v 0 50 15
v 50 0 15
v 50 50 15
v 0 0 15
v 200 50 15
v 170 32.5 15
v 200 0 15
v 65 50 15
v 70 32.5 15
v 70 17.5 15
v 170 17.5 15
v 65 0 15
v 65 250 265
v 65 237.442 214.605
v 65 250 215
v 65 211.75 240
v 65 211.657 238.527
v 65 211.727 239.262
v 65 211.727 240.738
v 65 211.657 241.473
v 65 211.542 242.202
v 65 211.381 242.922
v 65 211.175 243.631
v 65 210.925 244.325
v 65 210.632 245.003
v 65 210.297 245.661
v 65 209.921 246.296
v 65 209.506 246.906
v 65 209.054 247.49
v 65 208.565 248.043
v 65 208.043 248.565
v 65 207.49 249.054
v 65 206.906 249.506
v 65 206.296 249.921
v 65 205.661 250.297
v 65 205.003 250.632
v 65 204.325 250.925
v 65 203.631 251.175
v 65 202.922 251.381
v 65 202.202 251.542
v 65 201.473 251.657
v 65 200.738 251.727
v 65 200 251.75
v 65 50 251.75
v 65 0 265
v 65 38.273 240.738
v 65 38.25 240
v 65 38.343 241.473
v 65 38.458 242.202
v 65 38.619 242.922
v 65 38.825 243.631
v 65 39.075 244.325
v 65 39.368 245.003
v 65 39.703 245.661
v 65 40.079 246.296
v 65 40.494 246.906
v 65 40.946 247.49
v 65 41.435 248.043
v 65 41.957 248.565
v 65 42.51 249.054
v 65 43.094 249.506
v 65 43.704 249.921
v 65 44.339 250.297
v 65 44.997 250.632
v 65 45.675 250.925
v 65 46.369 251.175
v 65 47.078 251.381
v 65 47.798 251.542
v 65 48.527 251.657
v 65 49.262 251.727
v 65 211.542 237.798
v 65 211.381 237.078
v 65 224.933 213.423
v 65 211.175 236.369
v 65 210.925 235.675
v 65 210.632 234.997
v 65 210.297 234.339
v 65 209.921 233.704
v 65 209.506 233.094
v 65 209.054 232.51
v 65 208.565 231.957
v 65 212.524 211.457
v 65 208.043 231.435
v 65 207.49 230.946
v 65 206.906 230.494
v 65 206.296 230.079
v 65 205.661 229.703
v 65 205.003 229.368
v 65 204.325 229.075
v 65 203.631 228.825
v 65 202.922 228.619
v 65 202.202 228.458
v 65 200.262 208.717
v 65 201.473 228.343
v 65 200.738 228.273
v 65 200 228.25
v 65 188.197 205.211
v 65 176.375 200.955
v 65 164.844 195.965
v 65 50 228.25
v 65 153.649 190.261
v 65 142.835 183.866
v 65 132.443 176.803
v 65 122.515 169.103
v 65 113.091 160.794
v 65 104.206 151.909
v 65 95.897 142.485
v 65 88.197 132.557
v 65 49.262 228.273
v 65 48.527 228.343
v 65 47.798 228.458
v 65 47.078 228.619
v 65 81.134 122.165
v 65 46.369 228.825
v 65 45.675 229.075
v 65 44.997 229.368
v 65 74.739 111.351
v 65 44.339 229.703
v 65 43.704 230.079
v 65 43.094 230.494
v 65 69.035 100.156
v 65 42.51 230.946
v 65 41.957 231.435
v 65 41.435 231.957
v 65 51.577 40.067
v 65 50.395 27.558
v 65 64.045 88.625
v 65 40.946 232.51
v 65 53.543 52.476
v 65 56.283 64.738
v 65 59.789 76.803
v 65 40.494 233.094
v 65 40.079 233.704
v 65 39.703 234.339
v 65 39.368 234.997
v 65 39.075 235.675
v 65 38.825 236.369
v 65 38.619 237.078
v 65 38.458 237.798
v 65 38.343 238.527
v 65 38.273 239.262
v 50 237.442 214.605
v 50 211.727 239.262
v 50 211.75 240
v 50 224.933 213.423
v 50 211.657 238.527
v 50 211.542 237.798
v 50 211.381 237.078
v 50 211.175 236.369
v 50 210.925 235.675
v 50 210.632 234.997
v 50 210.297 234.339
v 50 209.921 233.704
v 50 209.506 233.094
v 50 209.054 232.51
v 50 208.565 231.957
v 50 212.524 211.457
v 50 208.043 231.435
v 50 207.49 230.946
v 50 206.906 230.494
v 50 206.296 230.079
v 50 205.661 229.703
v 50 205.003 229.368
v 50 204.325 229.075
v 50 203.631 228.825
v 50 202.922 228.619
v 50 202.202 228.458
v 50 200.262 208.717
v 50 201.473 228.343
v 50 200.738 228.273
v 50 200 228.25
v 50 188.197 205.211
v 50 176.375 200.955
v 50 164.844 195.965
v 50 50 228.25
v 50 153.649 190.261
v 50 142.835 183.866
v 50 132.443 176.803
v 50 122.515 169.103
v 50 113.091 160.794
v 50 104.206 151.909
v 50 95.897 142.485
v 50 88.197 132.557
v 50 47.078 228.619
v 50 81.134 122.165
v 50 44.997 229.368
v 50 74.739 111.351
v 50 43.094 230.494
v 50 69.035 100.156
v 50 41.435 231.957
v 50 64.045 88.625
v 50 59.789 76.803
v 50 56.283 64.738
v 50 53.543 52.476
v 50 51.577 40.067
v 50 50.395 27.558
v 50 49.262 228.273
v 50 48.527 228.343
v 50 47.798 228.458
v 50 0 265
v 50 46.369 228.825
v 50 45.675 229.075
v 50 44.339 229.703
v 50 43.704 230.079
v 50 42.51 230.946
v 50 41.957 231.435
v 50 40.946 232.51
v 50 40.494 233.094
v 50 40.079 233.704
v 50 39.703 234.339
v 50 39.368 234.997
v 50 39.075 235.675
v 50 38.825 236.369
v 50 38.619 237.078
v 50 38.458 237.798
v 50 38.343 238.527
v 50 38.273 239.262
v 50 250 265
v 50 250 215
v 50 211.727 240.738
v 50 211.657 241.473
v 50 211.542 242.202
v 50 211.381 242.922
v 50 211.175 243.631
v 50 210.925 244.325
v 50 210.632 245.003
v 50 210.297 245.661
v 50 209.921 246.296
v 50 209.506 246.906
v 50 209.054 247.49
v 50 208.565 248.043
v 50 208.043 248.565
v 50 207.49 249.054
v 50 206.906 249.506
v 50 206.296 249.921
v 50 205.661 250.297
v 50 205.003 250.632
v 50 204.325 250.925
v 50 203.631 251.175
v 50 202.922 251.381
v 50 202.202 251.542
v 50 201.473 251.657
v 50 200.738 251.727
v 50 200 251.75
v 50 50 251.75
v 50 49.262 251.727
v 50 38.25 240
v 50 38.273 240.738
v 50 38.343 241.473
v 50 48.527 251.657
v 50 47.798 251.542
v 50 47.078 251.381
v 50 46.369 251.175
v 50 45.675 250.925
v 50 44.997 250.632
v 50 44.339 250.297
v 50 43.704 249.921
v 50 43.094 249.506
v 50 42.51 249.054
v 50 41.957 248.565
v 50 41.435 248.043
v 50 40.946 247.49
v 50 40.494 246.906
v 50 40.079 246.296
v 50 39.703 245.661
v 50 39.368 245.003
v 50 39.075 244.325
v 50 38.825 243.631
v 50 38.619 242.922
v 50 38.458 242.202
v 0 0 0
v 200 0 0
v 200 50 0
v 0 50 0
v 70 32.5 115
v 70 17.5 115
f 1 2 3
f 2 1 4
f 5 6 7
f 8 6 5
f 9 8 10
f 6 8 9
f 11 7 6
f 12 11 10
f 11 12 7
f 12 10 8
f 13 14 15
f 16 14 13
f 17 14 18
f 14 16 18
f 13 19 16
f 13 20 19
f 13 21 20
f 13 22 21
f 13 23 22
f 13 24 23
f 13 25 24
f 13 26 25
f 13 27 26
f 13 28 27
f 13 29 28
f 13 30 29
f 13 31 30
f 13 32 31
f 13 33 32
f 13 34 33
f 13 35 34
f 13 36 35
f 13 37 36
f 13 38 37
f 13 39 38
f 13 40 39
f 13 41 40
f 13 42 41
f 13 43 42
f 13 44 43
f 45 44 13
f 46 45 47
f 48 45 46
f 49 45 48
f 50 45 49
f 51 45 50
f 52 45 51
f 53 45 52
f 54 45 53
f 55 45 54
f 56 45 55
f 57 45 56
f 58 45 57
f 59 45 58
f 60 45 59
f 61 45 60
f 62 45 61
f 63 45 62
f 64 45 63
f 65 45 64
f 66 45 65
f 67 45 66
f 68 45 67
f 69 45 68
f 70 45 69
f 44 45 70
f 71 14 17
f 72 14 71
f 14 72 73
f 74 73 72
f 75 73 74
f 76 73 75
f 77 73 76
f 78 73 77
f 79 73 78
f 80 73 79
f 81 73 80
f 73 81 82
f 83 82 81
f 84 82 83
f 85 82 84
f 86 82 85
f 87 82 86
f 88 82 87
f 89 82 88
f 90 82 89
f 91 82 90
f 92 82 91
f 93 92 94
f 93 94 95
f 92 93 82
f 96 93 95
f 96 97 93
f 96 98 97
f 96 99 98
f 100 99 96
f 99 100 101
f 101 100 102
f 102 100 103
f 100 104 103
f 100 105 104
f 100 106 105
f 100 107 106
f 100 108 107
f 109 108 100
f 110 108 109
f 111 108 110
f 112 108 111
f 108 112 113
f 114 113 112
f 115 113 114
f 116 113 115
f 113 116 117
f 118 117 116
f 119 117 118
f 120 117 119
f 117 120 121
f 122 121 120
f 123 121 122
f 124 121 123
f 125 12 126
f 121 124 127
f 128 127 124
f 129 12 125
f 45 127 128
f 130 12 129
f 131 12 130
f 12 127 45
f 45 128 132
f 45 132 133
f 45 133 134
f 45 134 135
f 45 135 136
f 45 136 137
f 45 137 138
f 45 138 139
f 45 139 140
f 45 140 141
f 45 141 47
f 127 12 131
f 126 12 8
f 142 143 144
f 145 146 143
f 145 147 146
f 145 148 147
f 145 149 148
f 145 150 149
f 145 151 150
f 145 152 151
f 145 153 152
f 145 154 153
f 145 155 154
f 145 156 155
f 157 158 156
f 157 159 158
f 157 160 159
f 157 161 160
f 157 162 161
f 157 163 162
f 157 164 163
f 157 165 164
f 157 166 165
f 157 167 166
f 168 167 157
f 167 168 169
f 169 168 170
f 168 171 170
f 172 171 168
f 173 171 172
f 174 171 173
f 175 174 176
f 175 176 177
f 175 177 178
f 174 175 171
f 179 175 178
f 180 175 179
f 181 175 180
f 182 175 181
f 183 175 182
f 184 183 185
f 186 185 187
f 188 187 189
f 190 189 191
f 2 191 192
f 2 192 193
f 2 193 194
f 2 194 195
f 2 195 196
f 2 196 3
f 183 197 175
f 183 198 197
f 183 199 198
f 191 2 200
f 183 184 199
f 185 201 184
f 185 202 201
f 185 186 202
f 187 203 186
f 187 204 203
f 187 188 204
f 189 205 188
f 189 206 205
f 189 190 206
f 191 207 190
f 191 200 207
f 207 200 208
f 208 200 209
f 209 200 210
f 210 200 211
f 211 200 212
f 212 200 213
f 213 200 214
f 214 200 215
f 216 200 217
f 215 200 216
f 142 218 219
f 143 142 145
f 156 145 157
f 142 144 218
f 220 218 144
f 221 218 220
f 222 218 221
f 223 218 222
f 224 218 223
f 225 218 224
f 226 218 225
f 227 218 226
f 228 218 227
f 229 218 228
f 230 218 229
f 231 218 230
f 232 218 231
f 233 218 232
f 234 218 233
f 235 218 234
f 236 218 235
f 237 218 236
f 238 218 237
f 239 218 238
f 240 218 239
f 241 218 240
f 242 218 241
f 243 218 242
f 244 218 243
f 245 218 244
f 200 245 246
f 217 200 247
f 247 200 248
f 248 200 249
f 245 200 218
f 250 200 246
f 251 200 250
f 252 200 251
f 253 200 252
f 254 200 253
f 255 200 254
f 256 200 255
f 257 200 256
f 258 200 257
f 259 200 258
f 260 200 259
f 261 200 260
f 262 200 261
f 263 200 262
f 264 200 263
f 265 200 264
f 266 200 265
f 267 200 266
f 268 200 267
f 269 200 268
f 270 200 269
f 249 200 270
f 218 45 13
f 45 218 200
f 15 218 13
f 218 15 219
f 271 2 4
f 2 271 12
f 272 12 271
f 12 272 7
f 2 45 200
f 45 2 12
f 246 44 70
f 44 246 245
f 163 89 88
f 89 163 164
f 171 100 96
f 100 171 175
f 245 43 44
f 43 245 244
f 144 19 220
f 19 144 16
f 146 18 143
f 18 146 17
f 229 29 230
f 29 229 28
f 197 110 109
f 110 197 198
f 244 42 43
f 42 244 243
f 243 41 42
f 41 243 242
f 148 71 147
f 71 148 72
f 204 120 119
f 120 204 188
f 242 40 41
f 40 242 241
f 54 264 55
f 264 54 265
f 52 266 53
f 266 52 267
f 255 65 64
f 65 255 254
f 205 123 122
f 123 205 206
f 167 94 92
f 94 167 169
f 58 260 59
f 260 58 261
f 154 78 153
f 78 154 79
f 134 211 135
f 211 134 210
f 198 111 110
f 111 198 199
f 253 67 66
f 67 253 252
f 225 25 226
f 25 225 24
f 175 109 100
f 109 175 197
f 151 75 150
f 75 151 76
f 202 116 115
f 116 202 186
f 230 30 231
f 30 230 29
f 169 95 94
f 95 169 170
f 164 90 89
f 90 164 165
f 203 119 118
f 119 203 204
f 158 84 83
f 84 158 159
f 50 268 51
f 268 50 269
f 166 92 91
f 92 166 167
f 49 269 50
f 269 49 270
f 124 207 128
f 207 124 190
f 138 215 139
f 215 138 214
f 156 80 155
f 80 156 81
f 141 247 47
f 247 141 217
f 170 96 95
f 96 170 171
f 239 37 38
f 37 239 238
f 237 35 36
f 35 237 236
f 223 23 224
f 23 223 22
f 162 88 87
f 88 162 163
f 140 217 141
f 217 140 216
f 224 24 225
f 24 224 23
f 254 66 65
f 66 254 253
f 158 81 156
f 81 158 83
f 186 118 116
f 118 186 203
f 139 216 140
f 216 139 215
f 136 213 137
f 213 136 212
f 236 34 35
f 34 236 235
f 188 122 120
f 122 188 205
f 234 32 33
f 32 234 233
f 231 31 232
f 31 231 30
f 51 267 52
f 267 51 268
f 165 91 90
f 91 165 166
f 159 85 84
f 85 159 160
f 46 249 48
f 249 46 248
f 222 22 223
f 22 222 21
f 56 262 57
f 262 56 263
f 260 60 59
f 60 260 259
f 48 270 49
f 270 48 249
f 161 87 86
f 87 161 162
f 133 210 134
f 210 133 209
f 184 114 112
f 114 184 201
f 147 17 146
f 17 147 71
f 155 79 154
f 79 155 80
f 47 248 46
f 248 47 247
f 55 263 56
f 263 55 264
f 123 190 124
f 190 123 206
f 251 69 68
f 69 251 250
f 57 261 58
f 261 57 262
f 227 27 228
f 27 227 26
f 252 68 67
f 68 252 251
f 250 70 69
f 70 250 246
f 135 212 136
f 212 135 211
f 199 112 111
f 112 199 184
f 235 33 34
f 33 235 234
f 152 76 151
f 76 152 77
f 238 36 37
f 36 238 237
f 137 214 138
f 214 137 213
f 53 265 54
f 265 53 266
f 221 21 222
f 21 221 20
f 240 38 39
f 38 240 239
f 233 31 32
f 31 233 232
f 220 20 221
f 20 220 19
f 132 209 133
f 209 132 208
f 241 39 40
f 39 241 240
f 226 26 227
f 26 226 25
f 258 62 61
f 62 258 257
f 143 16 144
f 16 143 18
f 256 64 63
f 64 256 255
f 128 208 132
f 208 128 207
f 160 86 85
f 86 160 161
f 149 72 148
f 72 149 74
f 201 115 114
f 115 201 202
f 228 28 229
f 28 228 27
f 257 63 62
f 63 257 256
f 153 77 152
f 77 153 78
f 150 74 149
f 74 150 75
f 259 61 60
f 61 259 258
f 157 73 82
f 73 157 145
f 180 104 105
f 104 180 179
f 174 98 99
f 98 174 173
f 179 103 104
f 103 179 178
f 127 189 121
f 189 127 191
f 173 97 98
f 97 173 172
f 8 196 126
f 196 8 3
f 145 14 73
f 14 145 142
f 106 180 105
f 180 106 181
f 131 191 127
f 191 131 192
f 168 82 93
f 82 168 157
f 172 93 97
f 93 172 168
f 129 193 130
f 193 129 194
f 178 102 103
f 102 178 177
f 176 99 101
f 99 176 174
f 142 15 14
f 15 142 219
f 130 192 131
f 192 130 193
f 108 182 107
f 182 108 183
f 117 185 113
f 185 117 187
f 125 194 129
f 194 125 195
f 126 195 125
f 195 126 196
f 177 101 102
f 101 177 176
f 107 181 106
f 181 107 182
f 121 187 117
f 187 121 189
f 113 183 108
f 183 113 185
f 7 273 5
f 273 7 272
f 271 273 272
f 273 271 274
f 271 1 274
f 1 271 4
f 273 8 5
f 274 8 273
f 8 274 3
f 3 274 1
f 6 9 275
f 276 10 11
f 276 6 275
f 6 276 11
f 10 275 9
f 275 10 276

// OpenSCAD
// file: ../lib.scad
/*
 * Make a pair of an object.
 *
 * @param split The distance to seperate the pair.
 *
 * @param rot An optional amount to rotate the pair.
 *
 * @param edge Center on the left of the pair rather than the middle.
 *
 * @pair mirrored Make the left a mirror of the right instead of a
 *                rotation.
 */
module pair(split,rot=0,edge=false/*, mirrord=false*/){
     module center(){
	  if(edge){
	       translate([split/2,0,0]){
		    children();}}
	  else{
	       children();}}
     rotate([0,0,rot]){
	  center(){
	       translate([split/2,0,0]){
		    children();}
	       translate([-split/2,0,0]){
		    rotate([0,0,180]){
			 children();}}}}}

module xpair(split,rot=0,edge=false){
     pair(split,rot,edge){
	  children();}}
module ypair(split,rot=0,edge=false){
     rotate(90){
	  pair(split,rot,edge){
	       rotate(-90){
		    children();}}}}

/*
 * Make a pair but with a middle element.
 *
 * @param split The distance to seperate the pair.
 *
 * @param rot An optional amount to rotate the pair.
 */
module tripple(split,rot=0){
     rotate([0,0,90]){
	  children();}
     pair(split,rot){
	  children();}}
/*
 * Make a set of objects in a circle.
 *
 * @param count The number of elements in the circle
 *
 * @param r The raius of the circle.
 */
module set(count,r){
     for(i=[0:count]){
	  rotate([0,0,360/count*i]){
	       translate([r,0,0]){
		    children();}}}}

module set_better(count,radius,r,diameter,d){
     module set_impl(count,r){
	  for(i=[0:count]){
	       rotate([0,0,360/count*i]){
		    translate([r,0,0]){
			 children();}}}}
     if(!count){
	  //error
     }
     if(radius){
	  if(r || diameter || d){
	       // error
	  }else{
	       set_impl(count,radius){
		    children();}}}
     if(r){
	  if(radius || diameter || d){
	       // error
	  }else{
	       set_impl(count,r){
		    children();}}}
     if(diameter){
	  if(radius || r || d){
	       // error
	  }else{
	       set_impl(count,diameter/2){
		    children();}}}
     if(d){
	  if(radius || r || diameter){
	       // error
	  }else{
	       set_impl(count,d/2){
		    children();}}}}

/*
 * A quick rename of translate along z.
 *
 * @param distance The distance to lift by.
 */
module up(distance){
     translate([0,0,distance]){
	  children();}}

module arch(radius,height,thickness){
     cylinder(r=radius,h=thickness);
     translate([0,-radius,0]){
	  cube([height-radius,2*radius,thickness]);}}
// main file
$fn=100;
mm=1; // define units
degrees=1;

use <../lib.scad>;

module example_108(){
     plate_thickness=15*mm;
     plate_width=50*mm;
     module bottom_plate()
	  cube([/*plate_length*/200,
		plate_width,
		plate_thickness]);
     module support_strut(){
	  support_size=100*mm;
	  linear_extrude(15){
	       polygon([[0,0],[support_size,0],[0,support_size]]);}}
     module arc_plate(){
	  module slot(){
	       hull(){
		    pair(split=150*mm,rot=90,edge=true){
			 cylinder(r=11.75*mm,h=20*mm);}}}
	  nom_radius=200*mm;// Changed from 195.3 to match picture.
	  side=250;
	  difference(){
	       cube([side,side,plate_thickness]);
	       translate([plate_width/2,plate_width,0]){
		    slot();}
	       translate([side,side,0]){
		    cylinder(r=nom_radius,h=plate_thickness);}}}

     bottom_plate();
     translate([70,15+17.5,plate_thickness])rotate([90,0,0])support_strut();
     translate([50,0,265]){rotate([0,90,0]){arc_plate();}}
}

example_108();
